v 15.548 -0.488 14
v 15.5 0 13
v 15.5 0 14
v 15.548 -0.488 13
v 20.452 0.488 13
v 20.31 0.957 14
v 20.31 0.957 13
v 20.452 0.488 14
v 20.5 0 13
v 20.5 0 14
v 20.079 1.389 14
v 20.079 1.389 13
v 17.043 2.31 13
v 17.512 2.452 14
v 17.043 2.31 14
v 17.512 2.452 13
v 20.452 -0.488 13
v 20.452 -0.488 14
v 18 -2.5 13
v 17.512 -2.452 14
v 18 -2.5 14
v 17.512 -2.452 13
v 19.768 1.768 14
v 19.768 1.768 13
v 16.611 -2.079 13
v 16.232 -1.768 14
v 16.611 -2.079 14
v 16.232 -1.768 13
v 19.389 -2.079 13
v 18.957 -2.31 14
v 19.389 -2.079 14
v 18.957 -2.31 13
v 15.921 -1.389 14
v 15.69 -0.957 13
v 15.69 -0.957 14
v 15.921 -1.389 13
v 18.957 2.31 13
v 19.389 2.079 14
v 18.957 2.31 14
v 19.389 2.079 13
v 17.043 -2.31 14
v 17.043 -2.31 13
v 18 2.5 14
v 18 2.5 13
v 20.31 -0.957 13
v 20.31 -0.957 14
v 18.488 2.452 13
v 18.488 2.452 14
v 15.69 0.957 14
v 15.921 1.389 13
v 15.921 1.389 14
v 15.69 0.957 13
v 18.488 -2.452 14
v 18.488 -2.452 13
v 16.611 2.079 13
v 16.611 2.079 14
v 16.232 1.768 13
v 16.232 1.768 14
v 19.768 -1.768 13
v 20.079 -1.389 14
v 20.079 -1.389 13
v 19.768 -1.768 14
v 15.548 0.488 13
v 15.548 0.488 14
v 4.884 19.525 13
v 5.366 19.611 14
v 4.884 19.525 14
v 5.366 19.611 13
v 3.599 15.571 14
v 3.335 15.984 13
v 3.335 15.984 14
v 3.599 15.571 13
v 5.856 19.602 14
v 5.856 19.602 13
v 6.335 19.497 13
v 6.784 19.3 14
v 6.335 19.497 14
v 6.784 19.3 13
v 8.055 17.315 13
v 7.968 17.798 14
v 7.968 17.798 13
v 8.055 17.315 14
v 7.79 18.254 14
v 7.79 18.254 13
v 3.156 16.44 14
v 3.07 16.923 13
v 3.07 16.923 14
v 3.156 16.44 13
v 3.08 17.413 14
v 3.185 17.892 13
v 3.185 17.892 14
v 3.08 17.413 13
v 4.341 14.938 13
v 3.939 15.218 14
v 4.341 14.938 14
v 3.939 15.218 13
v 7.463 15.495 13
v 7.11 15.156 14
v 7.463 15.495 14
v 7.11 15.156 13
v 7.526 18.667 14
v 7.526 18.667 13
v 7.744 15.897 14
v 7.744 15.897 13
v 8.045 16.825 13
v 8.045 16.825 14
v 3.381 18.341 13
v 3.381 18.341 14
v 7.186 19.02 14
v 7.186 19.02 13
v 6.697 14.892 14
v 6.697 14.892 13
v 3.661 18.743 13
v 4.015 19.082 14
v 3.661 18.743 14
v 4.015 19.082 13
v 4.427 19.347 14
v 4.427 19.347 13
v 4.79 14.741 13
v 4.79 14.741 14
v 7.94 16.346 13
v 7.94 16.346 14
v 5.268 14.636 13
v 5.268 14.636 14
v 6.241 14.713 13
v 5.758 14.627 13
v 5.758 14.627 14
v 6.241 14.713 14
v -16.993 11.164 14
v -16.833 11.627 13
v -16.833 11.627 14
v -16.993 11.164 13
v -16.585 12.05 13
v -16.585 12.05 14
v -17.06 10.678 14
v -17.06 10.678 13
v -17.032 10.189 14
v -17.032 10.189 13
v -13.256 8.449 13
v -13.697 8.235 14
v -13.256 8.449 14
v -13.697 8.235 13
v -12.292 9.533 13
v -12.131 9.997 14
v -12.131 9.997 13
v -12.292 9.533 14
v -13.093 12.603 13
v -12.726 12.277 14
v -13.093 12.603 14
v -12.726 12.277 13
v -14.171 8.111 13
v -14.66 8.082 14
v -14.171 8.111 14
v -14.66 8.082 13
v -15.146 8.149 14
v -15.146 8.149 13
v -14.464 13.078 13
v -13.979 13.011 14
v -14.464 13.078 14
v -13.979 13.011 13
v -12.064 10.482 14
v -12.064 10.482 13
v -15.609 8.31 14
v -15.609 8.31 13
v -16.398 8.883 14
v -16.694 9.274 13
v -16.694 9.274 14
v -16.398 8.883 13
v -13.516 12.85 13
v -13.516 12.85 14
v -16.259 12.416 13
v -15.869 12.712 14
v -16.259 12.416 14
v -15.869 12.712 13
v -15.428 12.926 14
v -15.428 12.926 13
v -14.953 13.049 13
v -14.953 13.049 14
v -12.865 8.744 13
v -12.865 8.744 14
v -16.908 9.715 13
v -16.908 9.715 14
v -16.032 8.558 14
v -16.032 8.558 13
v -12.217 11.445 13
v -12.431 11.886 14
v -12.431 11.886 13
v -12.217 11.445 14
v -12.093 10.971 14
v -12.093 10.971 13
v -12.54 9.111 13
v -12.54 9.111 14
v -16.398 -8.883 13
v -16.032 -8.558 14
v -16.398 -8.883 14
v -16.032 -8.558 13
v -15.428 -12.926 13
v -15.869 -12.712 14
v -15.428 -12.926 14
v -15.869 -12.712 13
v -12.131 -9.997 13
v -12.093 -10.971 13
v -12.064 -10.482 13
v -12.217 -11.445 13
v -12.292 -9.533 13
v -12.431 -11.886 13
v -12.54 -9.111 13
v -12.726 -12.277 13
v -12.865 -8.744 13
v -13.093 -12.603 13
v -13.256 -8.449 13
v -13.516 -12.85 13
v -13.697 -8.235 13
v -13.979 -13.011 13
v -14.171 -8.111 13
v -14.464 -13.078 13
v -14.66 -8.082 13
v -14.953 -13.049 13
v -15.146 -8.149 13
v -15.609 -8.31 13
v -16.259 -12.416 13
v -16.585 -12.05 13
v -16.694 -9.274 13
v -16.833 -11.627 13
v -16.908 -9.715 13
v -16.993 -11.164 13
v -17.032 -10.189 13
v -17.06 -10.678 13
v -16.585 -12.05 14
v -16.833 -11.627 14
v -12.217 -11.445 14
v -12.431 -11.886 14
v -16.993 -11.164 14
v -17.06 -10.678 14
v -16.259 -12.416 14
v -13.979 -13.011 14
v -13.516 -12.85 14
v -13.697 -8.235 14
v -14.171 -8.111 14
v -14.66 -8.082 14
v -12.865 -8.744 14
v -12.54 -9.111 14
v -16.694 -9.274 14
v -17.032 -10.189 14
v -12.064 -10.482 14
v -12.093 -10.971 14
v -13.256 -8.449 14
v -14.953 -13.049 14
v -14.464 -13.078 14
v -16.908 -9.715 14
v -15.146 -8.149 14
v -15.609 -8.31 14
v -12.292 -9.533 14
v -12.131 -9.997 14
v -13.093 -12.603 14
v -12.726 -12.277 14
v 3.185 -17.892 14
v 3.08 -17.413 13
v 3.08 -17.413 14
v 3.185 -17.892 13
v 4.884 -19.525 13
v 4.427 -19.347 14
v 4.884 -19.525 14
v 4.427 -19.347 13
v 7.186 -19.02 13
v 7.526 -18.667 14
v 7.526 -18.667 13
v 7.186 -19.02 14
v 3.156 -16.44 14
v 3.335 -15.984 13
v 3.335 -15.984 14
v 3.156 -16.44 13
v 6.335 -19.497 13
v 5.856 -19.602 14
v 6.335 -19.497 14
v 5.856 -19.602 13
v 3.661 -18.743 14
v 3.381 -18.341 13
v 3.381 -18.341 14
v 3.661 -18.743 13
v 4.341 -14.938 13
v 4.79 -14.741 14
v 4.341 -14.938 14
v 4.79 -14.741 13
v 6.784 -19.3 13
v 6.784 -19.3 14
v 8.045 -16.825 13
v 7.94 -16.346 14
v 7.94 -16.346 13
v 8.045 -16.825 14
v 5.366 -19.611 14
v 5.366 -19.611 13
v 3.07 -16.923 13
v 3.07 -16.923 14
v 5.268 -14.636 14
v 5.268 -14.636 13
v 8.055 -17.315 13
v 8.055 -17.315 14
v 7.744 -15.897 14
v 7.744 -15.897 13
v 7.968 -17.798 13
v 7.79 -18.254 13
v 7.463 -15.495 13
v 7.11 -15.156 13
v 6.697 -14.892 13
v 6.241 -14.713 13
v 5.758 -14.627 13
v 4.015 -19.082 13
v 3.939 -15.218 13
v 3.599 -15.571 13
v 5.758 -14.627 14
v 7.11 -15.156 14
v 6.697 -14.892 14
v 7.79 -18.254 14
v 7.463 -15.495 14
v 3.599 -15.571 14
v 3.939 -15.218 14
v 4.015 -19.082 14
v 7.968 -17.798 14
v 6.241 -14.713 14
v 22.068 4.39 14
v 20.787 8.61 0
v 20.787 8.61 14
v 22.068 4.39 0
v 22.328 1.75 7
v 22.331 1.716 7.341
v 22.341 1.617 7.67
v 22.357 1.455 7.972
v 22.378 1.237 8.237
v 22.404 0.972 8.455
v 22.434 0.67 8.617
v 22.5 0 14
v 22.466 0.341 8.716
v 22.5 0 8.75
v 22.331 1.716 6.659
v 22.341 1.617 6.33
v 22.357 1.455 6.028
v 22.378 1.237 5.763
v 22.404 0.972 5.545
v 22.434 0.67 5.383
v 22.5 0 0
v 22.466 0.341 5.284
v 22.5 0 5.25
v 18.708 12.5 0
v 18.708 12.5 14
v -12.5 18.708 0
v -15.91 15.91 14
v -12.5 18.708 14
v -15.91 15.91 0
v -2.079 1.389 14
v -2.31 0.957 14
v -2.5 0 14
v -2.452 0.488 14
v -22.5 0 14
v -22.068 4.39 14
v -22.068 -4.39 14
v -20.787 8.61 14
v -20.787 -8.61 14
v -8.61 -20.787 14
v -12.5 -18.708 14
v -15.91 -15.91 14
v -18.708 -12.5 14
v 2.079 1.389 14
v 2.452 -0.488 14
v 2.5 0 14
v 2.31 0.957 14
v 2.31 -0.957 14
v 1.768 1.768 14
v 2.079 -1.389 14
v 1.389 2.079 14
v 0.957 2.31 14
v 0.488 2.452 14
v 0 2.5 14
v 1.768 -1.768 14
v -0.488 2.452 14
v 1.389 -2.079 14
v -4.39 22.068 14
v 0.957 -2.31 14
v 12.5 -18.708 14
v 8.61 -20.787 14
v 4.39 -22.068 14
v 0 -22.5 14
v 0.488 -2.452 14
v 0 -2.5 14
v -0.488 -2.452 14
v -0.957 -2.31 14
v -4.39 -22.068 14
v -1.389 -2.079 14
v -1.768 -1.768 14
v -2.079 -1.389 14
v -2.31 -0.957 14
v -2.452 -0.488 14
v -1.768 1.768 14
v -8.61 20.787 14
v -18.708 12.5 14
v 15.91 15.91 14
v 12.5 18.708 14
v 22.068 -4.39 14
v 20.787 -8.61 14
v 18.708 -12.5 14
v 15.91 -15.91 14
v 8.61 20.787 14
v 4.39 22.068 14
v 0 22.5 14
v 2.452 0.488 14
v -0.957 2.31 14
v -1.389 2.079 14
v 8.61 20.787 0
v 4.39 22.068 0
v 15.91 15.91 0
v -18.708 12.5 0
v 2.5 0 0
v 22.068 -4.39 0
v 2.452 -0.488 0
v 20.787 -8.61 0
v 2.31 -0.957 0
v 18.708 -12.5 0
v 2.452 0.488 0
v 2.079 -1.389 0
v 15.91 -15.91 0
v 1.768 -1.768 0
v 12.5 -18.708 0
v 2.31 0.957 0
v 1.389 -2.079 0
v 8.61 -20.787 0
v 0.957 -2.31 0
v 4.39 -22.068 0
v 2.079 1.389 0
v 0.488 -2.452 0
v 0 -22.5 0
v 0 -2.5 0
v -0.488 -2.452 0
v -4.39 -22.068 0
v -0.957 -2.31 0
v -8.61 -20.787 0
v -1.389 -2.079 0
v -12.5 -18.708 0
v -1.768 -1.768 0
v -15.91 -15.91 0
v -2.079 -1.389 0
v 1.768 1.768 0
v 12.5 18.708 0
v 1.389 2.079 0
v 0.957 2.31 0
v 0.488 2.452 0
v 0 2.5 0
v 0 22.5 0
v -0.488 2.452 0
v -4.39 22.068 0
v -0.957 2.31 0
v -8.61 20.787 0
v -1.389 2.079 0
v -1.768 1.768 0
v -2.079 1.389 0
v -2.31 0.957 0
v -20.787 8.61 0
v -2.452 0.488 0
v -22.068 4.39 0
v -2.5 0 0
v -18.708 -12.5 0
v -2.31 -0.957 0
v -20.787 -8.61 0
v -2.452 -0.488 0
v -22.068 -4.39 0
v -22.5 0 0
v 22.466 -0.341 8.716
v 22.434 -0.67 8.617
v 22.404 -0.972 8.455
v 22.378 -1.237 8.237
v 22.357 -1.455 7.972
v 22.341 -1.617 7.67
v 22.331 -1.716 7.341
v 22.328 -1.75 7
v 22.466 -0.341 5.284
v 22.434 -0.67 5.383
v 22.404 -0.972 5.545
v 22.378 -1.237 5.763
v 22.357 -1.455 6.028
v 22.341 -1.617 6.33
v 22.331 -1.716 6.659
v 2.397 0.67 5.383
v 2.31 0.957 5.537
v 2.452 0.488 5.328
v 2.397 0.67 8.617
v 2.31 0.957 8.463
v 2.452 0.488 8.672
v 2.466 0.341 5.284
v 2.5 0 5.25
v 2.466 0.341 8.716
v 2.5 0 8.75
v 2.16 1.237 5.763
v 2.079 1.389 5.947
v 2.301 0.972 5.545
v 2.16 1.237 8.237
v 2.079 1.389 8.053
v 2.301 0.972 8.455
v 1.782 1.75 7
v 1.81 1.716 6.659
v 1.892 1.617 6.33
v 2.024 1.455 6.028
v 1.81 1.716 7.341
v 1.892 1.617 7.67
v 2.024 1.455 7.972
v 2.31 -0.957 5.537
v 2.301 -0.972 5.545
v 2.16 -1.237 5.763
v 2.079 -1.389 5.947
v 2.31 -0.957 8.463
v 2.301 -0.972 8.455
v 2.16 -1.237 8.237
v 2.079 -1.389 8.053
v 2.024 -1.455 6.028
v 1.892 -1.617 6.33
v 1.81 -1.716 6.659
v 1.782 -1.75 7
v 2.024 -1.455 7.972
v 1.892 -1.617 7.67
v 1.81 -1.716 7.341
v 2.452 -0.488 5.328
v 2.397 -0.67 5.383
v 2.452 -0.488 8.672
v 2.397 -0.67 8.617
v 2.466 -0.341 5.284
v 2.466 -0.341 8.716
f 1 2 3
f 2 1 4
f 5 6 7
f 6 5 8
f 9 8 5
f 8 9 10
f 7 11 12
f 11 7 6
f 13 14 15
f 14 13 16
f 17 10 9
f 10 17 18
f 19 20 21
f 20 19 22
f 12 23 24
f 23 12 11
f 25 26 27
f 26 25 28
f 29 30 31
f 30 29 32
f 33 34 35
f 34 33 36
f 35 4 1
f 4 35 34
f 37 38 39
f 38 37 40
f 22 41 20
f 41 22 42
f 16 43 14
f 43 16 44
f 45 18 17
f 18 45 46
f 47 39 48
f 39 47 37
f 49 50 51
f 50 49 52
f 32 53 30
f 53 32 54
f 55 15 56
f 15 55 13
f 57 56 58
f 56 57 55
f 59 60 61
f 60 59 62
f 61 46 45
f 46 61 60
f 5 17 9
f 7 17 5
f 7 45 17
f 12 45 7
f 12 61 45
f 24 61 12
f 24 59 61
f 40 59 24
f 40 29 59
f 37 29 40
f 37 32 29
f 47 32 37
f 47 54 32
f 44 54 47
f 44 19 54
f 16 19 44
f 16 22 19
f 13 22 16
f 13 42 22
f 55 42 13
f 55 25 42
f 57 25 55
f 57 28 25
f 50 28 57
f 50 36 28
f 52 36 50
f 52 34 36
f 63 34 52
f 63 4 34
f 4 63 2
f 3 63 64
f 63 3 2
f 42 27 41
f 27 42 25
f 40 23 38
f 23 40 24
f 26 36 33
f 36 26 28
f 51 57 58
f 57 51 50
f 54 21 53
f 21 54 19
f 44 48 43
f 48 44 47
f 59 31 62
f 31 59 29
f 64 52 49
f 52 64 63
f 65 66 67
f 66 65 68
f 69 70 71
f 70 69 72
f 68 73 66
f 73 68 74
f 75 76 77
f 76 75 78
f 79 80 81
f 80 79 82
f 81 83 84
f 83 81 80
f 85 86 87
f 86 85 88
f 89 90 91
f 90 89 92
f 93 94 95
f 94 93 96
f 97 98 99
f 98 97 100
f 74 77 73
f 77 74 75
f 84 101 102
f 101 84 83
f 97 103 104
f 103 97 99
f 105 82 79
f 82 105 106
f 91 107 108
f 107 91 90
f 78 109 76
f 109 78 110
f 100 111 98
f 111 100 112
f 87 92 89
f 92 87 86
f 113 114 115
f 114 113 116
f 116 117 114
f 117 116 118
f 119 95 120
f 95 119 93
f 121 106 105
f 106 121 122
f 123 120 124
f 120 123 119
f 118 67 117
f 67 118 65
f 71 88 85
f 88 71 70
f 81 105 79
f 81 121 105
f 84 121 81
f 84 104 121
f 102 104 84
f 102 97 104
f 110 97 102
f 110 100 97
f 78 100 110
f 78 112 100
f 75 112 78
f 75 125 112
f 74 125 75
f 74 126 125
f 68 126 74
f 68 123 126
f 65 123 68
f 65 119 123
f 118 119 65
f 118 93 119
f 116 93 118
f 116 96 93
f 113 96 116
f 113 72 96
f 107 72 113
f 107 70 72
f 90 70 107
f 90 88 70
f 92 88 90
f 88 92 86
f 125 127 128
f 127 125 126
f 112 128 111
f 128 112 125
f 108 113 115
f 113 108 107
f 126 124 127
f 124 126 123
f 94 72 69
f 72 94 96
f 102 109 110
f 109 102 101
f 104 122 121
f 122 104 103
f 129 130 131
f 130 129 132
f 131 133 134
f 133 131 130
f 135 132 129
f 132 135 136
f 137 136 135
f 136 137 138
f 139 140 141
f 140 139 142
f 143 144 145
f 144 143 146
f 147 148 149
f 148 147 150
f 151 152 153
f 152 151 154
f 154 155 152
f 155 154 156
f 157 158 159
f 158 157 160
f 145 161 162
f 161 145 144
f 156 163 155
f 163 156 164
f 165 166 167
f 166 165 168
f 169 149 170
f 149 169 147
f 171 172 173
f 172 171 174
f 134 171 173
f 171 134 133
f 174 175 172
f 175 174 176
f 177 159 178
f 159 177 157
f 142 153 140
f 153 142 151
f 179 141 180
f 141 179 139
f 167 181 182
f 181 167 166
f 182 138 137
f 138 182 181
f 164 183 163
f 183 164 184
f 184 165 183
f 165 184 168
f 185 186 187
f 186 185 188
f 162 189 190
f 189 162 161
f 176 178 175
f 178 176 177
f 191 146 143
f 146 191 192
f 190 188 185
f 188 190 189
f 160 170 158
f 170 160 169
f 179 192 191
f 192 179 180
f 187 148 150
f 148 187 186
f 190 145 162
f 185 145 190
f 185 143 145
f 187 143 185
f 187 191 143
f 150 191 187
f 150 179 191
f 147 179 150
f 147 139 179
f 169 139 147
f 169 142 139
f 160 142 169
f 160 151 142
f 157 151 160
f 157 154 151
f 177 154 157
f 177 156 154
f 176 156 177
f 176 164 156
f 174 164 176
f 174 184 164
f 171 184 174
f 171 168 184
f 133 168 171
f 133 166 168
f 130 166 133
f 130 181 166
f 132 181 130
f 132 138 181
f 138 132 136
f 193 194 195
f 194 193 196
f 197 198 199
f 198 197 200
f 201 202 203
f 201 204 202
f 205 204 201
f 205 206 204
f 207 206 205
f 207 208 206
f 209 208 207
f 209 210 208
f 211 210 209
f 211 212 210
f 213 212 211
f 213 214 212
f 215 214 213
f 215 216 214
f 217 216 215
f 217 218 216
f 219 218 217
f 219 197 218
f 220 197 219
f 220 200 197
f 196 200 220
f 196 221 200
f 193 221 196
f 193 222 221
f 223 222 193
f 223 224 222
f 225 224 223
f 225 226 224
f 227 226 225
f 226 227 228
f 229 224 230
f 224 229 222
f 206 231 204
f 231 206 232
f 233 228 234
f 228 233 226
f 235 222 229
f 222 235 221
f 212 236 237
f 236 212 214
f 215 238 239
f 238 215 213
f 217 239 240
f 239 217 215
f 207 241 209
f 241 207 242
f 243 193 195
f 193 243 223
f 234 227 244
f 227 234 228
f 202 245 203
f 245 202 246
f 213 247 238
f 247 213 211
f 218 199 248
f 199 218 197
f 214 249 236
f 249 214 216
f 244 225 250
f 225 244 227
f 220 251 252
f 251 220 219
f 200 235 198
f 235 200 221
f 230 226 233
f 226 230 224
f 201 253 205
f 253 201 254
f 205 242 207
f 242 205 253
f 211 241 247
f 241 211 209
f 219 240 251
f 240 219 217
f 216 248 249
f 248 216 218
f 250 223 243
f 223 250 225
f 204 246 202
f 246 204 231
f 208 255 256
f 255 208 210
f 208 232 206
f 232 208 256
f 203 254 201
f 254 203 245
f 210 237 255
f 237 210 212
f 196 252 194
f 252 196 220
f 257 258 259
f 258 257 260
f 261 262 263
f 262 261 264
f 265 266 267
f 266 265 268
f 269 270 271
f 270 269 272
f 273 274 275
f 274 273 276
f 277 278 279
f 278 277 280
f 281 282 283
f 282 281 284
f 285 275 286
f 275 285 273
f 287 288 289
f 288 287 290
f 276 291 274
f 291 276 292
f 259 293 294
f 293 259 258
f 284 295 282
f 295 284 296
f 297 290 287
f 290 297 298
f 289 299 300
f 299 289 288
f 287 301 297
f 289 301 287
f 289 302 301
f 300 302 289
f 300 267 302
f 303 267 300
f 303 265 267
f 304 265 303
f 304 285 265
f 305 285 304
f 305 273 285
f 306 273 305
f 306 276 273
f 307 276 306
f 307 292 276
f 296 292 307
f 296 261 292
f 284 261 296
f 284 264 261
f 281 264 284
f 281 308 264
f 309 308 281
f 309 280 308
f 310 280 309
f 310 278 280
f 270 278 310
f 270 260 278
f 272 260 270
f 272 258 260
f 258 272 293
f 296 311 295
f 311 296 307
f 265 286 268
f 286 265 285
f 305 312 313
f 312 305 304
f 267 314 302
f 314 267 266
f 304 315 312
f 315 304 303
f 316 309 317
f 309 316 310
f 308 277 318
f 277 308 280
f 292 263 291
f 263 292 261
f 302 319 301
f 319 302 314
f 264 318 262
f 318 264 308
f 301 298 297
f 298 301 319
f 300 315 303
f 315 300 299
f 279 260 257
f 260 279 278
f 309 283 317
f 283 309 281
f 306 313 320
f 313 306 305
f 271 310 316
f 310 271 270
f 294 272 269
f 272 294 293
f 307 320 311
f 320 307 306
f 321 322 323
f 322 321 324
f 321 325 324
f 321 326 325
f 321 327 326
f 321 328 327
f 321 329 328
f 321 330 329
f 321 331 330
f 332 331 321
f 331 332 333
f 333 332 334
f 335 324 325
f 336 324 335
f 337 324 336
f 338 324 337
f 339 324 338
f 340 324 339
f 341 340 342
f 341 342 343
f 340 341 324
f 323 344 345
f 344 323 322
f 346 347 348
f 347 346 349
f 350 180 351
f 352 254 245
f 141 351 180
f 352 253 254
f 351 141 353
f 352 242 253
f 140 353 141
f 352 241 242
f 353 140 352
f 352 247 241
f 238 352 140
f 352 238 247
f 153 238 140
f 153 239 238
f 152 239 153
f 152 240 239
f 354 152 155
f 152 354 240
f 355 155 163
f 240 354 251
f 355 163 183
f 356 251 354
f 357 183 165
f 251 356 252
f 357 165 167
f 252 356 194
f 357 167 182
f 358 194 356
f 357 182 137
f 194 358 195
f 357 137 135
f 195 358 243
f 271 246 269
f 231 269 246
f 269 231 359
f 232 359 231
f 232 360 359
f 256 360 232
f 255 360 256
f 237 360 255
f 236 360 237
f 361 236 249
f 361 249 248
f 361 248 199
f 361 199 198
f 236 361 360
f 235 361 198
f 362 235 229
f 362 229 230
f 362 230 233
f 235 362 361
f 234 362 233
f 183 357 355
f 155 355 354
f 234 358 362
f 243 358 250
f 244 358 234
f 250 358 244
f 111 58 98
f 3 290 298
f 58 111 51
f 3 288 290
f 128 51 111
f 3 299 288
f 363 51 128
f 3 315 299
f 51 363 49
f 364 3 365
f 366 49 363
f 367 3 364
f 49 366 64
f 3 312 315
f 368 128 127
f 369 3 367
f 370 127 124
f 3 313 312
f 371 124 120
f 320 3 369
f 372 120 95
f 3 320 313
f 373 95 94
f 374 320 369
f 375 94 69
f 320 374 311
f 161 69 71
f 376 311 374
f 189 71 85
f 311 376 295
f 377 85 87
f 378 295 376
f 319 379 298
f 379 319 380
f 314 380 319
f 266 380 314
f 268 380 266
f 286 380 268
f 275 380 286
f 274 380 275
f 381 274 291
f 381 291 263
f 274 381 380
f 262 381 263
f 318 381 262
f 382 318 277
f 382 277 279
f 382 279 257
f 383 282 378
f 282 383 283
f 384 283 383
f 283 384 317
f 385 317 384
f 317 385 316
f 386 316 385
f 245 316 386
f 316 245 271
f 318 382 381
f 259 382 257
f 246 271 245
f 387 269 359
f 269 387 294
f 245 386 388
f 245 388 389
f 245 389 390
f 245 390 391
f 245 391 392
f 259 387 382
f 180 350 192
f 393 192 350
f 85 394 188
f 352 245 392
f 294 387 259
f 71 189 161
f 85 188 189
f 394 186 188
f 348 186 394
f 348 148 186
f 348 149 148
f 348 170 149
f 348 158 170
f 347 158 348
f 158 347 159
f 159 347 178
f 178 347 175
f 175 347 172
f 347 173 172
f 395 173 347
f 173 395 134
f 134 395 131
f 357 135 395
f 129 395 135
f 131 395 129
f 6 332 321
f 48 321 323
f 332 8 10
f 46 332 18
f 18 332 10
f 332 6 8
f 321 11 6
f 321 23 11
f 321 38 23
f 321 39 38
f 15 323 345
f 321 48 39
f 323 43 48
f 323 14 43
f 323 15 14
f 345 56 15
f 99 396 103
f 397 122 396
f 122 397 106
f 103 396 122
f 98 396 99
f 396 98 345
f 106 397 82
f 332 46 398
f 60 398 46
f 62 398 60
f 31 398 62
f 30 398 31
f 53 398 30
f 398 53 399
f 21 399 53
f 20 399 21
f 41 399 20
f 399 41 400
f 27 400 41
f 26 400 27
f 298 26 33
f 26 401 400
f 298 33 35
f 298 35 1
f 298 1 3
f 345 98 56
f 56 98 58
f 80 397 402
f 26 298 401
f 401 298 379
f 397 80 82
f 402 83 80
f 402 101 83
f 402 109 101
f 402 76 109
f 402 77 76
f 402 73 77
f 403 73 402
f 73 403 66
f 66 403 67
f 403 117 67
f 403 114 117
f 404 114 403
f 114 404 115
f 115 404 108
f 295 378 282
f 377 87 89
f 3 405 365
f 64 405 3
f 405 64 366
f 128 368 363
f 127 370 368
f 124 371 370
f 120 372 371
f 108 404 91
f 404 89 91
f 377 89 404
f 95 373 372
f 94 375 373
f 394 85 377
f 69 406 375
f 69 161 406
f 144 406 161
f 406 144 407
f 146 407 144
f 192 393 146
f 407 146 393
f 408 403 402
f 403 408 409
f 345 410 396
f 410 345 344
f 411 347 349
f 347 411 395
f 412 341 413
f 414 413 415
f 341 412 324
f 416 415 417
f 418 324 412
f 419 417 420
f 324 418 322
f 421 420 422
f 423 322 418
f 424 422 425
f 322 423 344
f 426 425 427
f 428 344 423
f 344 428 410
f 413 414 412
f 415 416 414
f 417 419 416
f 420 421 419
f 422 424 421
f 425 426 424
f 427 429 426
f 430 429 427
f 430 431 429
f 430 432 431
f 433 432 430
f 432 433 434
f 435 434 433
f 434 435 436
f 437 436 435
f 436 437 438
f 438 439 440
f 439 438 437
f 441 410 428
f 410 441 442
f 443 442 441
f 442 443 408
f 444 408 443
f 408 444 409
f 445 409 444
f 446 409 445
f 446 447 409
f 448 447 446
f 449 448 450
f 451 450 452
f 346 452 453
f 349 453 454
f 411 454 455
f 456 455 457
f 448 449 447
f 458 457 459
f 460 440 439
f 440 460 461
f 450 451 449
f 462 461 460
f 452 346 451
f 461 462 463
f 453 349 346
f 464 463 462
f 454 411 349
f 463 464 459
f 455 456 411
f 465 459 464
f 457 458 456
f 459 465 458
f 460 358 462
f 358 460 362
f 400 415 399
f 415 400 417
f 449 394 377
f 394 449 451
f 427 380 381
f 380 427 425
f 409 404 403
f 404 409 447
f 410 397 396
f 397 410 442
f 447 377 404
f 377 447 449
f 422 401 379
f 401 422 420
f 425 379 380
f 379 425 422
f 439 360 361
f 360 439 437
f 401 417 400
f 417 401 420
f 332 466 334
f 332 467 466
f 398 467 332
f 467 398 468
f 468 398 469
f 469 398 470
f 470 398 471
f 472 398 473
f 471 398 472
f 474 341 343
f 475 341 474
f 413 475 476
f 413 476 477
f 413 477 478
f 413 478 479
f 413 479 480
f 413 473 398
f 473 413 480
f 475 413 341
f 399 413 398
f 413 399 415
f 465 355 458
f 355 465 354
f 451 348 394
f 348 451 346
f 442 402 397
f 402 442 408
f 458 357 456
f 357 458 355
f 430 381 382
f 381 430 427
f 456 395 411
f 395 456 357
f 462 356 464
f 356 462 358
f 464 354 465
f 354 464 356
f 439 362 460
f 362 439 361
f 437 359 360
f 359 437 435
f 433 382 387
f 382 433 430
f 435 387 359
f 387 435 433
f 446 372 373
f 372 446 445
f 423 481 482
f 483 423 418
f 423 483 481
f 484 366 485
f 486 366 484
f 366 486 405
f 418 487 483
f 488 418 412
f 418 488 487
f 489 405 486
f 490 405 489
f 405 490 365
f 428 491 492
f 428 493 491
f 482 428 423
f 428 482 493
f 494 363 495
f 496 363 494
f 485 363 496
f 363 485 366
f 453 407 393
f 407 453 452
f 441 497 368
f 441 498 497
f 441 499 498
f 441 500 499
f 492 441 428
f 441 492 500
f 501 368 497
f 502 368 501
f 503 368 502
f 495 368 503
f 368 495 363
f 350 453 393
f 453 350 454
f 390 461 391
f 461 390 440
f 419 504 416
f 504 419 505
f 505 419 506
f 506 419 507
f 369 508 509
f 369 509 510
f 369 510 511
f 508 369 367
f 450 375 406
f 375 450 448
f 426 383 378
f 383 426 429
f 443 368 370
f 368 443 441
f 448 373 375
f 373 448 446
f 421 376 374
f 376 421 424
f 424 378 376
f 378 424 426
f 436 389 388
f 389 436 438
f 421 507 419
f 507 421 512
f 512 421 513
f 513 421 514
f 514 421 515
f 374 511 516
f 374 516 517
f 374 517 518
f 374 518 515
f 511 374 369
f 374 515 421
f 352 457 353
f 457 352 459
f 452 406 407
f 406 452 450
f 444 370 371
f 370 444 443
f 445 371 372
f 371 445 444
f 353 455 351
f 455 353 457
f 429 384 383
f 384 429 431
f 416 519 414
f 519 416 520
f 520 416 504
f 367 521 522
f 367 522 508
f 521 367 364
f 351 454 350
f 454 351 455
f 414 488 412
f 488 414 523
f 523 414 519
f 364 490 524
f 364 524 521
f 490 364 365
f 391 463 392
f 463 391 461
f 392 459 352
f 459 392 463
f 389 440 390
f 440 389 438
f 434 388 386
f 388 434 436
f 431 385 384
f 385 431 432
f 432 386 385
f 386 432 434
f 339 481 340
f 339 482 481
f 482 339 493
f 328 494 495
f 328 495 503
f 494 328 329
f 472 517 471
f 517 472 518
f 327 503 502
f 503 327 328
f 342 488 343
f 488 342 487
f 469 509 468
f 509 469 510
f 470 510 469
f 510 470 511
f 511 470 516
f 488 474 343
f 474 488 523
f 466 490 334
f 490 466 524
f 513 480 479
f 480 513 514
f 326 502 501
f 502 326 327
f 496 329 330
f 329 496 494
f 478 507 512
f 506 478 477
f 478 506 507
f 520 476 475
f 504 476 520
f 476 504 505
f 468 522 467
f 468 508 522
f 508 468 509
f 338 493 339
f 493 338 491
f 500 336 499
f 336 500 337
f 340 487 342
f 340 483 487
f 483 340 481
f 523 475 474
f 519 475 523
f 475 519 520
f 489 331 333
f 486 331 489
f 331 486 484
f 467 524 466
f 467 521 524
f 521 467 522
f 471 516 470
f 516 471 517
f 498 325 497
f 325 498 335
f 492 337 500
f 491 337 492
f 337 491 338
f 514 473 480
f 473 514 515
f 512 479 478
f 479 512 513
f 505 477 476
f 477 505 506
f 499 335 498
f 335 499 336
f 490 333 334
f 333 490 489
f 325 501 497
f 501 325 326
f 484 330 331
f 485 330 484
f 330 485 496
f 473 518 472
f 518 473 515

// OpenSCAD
$fn = 32;

// ----------------------------------------------------------------------
// Control knob: dimpled knob
// ----------------------------------------------------------------------

// --- parameters (mm) ---
dimp_d = 5;               // finger dimple diameter
n_dimp = 5;               // number of dimples
dimp_r = 18;              // dimple ring radius
knob_d = 45;              // knob body diameter
knob_h = 14;              // knob body height
bore_d = 5;               // shaft bore diameter
set_d = 3.5;              // set screw bore diameter

dimp_step = 360 / n_dimp;  // dimple angular step

difference() {
  cylinder(h = knob_h, d = knob_d);
  translate([0, 0, -1]) cylinder(h = knob_h + 2, d = bore_d);
  translate([-1, 0, knob_h / 2]) rotate([0, 90, 0])
    cylinder(h = knob_d / 2 + bore_d / 2 + 2, d = set_d);  for (i = [0 : n_dimp - 1])
    rotate([0, 0, i * dimp_step])
      translate([dimp_r, 0, knob_h - 1])
        cylinder(h = 2, d = dimp_d);
}
